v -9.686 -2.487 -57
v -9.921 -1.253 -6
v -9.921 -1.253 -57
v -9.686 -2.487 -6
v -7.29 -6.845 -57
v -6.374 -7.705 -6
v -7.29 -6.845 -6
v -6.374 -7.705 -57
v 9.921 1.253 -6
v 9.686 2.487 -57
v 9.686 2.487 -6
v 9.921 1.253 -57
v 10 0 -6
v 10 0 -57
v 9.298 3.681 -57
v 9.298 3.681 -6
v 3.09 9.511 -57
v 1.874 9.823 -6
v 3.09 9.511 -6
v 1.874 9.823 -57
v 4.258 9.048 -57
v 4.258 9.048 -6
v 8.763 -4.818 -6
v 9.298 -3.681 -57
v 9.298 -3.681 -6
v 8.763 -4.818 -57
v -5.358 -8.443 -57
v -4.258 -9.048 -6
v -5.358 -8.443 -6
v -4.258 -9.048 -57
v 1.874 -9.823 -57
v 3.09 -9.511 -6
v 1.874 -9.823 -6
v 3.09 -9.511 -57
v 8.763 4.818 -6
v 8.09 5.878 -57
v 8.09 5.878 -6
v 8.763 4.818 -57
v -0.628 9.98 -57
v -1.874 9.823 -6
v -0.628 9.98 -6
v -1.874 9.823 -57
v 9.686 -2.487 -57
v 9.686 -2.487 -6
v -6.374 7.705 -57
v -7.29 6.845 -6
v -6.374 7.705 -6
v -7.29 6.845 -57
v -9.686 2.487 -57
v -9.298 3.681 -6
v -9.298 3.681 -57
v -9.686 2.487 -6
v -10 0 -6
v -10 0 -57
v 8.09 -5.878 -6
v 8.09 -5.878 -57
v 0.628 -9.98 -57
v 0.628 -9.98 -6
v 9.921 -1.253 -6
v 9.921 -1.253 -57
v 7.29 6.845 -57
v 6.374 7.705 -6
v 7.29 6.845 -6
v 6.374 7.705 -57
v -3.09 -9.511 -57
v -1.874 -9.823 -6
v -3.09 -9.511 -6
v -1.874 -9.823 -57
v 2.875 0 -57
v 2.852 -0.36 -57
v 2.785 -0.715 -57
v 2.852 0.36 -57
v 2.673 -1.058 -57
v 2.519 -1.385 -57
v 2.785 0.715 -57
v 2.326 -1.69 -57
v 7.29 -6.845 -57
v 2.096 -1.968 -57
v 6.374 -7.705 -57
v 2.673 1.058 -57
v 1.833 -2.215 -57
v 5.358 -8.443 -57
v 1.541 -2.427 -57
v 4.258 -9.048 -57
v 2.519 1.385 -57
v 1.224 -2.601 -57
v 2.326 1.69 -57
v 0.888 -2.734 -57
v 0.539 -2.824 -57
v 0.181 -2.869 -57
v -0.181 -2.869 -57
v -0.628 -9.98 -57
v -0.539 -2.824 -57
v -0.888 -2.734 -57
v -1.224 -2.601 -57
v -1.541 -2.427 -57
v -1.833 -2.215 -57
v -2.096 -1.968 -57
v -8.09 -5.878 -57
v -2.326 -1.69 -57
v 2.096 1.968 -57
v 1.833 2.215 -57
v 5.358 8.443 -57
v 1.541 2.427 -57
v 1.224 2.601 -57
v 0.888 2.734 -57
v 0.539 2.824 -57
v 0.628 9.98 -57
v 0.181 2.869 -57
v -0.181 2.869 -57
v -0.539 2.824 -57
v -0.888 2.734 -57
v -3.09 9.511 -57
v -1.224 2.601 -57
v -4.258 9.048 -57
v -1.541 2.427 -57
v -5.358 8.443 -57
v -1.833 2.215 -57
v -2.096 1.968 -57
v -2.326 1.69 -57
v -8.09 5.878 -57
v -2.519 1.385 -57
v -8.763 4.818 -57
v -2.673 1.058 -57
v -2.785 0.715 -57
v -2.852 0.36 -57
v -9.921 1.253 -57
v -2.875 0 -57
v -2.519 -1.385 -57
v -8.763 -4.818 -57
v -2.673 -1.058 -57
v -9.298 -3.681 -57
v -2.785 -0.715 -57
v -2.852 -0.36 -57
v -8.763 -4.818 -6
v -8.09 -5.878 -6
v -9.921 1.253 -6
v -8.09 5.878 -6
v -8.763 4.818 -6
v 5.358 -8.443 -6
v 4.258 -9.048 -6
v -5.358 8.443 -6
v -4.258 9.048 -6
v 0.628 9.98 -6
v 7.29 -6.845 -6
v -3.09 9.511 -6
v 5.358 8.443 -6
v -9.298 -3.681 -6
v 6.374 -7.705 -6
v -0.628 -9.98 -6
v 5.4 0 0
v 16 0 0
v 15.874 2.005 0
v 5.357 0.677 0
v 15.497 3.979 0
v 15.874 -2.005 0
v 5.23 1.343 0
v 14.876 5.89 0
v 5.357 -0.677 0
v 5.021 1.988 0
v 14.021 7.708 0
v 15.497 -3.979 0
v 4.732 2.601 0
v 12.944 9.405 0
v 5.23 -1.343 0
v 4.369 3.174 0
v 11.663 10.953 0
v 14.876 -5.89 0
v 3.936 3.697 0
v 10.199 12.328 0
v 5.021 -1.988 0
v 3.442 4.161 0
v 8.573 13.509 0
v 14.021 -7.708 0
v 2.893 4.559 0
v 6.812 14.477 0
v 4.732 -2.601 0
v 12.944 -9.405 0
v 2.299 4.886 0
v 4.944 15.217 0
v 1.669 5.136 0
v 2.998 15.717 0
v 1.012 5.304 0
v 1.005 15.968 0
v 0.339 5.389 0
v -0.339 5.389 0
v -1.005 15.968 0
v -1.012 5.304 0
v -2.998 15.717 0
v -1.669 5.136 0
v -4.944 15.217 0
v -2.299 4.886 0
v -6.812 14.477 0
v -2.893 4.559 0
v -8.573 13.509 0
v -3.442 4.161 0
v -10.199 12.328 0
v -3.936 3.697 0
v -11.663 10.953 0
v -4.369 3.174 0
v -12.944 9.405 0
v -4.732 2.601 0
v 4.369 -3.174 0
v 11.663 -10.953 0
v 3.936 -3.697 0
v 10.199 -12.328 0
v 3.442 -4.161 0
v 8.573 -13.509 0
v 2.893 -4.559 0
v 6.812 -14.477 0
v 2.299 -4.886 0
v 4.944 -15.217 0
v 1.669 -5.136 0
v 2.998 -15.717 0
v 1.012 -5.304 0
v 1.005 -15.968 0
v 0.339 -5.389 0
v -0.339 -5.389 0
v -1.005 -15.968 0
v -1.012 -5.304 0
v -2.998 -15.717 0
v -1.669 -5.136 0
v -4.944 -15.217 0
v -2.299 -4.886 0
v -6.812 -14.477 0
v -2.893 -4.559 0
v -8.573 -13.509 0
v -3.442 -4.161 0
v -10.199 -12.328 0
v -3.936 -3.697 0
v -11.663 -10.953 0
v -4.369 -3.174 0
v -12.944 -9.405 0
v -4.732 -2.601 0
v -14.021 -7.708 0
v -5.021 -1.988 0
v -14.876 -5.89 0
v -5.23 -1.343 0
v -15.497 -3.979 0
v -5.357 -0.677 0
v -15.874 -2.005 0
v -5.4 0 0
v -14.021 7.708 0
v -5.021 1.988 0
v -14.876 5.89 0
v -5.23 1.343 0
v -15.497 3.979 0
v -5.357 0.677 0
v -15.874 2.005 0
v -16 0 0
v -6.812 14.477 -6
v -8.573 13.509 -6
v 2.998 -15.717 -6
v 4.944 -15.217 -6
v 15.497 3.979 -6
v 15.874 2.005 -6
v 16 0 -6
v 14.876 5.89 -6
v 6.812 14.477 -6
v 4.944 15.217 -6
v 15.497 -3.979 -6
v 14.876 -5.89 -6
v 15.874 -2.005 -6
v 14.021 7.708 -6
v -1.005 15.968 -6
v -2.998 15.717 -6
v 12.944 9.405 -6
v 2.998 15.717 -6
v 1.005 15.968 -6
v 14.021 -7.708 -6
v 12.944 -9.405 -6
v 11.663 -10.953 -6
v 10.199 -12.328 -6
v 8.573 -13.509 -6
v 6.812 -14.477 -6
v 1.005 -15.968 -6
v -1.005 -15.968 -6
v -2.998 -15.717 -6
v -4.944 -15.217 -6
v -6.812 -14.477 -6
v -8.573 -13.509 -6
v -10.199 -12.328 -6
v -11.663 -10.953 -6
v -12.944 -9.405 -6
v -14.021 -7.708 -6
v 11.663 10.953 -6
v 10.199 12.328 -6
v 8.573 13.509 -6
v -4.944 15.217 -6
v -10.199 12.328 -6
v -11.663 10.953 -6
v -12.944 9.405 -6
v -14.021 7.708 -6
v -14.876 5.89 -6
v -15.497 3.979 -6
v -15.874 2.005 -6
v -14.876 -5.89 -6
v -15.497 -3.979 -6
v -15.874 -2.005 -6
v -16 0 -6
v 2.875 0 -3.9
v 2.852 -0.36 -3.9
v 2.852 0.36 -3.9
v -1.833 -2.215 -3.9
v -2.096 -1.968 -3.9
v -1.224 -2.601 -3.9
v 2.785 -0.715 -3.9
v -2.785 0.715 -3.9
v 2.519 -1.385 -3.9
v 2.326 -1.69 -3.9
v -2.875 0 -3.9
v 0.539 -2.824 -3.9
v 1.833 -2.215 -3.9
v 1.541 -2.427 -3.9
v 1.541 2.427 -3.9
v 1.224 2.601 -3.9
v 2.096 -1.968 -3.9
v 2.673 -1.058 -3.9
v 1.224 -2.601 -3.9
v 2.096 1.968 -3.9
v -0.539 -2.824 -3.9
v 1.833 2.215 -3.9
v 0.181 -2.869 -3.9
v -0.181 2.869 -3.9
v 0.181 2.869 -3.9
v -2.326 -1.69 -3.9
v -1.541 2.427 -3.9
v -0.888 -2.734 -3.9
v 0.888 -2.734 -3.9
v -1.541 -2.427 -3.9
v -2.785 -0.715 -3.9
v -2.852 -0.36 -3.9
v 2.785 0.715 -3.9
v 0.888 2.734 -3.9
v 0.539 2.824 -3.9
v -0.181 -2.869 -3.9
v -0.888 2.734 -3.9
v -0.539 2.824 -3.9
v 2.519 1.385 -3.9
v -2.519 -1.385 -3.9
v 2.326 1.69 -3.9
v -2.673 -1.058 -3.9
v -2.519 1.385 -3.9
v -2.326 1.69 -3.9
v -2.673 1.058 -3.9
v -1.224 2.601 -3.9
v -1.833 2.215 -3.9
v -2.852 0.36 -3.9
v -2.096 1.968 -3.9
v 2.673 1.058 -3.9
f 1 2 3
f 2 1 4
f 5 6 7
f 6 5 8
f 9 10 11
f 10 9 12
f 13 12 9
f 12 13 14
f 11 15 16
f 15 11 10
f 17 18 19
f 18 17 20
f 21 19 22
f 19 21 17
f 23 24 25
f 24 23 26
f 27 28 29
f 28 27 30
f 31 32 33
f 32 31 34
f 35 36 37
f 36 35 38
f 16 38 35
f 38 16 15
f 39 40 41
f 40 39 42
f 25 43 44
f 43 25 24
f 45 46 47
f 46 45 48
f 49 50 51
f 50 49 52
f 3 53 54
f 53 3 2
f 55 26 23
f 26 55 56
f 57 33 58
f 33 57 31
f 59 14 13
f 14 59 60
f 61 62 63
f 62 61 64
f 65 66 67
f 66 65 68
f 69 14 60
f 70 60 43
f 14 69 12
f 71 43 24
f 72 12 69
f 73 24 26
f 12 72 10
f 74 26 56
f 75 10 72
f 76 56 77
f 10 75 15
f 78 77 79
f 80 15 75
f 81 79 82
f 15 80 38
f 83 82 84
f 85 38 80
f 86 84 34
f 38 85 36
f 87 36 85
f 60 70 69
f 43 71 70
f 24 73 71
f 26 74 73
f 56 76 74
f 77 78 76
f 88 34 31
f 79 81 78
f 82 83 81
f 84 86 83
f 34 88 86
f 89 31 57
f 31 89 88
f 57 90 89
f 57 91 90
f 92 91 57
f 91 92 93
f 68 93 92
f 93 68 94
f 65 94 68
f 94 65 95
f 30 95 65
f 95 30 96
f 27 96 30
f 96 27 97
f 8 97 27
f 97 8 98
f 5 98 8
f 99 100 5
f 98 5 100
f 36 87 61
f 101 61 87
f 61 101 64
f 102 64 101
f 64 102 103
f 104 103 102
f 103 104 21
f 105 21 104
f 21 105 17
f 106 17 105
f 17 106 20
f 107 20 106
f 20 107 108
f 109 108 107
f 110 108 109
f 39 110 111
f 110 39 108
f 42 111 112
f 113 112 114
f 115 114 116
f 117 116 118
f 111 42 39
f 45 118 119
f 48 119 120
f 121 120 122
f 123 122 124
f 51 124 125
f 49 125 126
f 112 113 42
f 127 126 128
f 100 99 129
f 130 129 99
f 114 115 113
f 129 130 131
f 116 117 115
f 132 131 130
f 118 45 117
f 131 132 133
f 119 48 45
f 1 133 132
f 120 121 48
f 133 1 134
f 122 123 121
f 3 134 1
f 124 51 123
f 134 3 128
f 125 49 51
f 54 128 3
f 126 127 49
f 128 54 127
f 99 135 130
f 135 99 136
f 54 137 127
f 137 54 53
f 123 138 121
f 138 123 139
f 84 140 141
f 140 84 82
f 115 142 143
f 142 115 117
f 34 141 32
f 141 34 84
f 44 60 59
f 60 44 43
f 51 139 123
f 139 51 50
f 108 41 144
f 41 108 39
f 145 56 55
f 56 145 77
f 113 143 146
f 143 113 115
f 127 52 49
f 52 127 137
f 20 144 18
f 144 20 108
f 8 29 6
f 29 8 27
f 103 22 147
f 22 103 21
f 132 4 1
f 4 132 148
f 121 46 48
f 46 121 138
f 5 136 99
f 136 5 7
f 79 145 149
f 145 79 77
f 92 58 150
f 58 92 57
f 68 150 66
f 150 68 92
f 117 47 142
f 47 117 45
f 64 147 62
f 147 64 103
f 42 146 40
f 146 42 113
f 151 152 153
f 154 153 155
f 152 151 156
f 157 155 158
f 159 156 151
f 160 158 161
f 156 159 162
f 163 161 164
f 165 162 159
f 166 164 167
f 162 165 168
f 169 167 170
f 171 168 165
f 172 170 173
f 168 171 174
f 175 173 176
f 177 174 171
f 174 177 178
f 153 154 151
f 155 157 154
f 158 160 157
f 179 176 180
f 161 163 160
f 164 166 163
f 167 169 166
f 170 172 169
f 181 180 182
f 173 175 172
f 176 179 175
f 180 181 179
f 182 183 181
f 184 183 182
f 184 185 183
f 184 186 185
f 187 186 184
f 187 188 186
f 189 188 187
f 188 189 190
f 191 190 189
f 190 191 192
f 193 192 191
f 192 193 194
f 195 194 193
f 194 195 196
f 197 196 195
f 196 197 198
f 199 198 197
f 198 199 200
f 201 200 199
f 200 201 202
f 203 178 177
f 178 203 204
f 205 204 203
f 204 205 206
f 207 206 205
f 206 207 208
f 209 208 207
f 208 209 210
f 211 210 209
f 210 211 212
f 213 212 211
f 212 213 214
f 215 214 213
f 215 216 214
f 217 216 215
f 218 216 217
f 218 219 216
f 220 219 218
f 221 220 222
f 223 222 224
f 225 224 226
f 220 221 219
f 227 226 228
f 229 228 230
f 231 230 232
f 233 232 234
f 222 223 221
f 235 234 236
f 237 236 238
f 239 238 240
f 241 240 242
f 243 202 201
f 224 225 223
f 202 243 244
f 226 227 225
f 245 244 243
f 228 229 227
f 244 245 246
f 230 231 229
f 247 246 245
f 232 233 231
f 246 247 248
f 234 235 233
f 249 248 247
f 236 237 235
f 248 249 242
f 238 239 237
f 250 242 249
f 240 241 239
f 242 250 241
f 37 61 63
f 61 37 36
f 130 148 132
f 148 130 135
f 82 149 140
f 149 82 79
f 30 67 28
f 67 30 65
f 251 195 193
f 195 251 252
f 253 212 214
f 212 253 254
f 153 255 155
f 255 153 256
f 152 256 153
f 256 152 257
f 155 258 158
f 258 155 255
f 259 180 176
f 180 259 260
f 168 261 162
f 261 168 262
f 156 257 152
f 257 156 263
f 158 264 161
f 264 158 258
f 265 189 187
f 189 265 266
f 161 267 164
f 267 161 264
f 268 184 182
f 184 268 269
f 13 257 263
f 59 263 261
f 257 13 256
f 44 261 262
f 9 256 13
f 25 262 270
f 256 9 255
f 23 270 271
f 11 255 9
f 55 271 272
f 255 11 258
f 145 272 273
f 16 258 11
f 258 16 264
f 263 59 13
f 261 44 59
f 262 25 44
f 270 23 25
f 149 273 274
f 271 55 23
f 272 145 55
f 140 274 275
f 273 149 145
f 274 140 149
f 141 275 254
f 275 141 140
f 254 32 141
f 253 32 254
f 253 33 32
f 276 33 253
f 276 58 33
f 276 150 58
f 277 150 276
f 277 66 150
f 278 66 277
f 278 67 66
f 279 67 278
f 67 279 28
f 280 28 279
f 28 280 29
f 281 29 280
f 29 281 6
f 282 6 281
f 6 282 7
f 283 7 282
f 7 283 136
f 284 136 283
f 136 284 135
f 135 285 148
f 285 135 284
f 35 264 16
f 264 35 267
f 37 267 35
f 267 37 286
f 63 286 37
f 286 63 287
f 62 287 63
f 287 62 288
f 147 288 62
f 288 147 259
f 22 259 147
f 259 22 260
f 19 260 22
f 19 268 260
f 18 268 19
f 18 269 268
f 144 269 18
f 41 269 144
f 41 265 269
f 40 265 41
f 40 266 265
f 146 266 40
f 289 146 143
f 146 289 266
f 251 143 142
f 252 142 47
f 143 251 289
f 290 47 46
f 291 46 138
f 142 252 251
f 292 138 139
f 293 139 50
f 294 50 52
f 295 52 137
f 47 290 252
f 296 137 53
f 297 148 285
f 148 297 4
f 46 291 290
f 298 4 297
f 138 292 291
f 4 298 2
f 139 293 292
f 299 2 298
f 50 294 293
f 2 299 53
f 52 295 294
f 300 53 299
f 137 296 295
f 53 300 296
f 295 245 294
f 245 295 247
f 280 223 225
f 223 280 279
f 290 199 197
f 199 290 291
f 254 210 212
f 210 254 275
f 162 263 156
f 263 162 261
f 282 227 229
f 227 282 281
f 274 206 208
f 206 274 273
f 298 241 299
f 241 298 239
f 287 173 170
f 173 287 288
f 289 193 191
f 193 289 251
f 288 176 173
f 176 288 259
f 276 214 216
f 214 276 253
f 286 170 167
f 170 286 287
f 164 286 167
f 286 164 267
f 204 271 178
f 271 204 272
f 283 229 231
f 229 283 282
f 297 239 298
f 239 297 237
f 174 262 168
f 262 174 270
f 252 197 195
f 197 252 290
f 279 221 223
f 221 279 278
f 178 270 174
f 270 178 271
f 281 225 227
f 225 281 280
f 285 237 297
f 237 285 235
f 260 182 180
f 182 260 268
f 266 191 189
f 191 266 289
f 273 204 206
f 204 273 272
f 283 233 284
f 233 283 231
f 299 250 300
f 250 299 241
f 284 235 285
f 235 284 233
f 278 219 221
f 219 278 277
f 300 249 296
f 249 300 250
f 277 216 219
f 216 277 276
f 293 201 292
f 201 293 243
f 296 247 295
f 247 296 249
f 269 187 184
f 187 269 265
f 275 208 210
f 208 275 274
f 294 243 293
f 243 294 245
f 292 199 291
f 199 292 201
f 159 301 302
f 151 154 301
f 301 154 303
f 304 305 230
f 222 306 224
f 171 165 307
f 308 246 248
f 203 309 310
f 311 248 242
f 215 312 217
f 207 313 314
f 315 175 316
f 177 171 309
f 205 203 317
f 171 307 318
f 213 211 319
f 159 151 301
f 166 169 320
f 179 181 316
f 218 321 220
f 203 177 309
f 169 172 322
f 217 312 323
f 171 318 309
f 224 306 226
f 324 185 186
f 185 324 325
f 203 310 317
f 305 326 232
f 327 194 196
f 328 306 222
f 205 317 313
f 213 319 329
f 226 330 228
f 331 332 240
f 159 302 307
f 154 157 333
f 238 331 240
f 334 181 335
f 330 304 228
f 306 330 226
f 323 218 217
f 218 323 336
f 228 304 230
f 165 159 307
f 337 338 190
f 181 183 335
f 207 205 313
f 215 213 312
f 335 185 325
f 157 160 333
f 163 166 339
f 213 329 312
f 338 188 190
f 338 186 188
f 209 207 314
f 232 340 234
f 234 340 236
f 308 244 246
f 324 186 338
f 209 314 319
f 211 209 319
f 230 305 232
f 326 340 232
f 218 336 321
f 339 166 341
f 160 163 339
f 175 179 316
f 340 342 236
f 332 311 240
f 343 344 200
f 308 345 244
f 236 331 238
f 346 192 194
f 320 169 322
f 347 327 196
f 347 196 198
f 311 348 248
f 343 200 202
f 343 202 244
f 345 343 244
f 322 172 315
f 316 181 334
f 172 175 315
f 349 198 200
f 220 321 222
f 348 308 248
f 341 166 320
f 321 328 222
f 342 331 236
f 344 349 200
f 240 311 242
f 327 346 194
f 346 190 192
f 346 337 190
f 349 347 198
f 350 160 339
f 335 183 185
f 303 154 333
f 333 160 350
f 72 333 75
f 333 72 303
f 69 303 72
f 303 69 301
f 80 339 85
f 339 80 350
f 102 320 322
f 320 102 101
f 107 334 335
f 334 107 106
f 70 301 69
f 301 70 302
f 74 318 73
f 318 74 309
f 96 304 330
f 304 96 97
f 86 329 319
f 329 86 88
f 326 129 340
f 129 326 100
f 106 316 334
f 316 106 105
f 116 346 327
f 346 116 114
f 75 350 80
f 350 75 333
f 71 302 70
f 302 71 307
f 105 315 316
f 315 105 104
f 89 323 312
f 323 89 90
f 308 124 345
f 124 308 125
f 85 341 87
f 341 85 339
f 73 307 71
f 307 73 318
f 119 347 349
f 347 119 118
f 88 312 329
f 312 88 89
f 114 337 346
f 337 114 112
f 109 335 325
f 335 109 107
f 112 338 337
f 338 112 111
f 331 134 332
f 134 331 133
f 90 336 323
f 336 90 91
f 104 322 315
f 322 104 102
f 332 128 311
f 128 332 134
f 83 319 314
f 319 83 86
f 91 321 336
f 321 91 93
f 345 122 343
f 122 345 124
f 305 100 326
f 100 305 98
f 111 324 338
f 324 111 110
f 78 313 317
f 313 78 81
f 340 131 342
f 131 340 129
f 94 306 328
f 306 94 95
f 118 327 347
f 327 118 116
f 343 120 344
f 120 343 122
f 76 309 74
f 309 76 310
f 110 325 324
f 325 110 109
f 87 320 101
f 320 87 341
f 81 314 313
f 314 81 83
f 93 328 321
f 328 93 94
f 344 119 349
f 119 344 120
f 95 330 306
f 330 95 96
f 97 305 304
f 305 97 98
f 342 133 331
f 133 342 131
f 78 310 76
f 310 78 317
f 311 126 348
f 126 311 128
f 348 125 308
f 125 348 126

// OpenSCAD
$fn = 50;


difference() {
	union() {
		translate(v = [0, 0, -57.0000000000]) {
			cylinder(h = 57, r = 10.0000000000);
		}
		translate(v = [0, 0, -6.0000000000]) {
			cylinder(h = 6, r = 16.0000000000);
		}
	}
	union() {
		translate(v = [0, 0, 0]) {
			rotate(a = [0, 0, 0]) {
				difference() {
					union() {
						#translate(v = [0, 0, -57.0000000000]) {
							cylinder(h = 57, r = 2.6000000000);
						}
						#translate(v = [0, 0, -3.9000000000]) {
							cylinder(h = 3.9000000000, r = 10.0000000000, r1 = 2.8750000000, r2 = 5.4000000000);
						}
						#translate(v = [0, 0, -57.0000000000]) {
							cylinder(h = 57, r = 2.8750000000);
						}
						#translate(v = [0, 0, -57.0000000000]) {
							cylinder(h = 57, r = 2.6000000000);
						}
					}
					union();
				}
			}
		}
	}
}
